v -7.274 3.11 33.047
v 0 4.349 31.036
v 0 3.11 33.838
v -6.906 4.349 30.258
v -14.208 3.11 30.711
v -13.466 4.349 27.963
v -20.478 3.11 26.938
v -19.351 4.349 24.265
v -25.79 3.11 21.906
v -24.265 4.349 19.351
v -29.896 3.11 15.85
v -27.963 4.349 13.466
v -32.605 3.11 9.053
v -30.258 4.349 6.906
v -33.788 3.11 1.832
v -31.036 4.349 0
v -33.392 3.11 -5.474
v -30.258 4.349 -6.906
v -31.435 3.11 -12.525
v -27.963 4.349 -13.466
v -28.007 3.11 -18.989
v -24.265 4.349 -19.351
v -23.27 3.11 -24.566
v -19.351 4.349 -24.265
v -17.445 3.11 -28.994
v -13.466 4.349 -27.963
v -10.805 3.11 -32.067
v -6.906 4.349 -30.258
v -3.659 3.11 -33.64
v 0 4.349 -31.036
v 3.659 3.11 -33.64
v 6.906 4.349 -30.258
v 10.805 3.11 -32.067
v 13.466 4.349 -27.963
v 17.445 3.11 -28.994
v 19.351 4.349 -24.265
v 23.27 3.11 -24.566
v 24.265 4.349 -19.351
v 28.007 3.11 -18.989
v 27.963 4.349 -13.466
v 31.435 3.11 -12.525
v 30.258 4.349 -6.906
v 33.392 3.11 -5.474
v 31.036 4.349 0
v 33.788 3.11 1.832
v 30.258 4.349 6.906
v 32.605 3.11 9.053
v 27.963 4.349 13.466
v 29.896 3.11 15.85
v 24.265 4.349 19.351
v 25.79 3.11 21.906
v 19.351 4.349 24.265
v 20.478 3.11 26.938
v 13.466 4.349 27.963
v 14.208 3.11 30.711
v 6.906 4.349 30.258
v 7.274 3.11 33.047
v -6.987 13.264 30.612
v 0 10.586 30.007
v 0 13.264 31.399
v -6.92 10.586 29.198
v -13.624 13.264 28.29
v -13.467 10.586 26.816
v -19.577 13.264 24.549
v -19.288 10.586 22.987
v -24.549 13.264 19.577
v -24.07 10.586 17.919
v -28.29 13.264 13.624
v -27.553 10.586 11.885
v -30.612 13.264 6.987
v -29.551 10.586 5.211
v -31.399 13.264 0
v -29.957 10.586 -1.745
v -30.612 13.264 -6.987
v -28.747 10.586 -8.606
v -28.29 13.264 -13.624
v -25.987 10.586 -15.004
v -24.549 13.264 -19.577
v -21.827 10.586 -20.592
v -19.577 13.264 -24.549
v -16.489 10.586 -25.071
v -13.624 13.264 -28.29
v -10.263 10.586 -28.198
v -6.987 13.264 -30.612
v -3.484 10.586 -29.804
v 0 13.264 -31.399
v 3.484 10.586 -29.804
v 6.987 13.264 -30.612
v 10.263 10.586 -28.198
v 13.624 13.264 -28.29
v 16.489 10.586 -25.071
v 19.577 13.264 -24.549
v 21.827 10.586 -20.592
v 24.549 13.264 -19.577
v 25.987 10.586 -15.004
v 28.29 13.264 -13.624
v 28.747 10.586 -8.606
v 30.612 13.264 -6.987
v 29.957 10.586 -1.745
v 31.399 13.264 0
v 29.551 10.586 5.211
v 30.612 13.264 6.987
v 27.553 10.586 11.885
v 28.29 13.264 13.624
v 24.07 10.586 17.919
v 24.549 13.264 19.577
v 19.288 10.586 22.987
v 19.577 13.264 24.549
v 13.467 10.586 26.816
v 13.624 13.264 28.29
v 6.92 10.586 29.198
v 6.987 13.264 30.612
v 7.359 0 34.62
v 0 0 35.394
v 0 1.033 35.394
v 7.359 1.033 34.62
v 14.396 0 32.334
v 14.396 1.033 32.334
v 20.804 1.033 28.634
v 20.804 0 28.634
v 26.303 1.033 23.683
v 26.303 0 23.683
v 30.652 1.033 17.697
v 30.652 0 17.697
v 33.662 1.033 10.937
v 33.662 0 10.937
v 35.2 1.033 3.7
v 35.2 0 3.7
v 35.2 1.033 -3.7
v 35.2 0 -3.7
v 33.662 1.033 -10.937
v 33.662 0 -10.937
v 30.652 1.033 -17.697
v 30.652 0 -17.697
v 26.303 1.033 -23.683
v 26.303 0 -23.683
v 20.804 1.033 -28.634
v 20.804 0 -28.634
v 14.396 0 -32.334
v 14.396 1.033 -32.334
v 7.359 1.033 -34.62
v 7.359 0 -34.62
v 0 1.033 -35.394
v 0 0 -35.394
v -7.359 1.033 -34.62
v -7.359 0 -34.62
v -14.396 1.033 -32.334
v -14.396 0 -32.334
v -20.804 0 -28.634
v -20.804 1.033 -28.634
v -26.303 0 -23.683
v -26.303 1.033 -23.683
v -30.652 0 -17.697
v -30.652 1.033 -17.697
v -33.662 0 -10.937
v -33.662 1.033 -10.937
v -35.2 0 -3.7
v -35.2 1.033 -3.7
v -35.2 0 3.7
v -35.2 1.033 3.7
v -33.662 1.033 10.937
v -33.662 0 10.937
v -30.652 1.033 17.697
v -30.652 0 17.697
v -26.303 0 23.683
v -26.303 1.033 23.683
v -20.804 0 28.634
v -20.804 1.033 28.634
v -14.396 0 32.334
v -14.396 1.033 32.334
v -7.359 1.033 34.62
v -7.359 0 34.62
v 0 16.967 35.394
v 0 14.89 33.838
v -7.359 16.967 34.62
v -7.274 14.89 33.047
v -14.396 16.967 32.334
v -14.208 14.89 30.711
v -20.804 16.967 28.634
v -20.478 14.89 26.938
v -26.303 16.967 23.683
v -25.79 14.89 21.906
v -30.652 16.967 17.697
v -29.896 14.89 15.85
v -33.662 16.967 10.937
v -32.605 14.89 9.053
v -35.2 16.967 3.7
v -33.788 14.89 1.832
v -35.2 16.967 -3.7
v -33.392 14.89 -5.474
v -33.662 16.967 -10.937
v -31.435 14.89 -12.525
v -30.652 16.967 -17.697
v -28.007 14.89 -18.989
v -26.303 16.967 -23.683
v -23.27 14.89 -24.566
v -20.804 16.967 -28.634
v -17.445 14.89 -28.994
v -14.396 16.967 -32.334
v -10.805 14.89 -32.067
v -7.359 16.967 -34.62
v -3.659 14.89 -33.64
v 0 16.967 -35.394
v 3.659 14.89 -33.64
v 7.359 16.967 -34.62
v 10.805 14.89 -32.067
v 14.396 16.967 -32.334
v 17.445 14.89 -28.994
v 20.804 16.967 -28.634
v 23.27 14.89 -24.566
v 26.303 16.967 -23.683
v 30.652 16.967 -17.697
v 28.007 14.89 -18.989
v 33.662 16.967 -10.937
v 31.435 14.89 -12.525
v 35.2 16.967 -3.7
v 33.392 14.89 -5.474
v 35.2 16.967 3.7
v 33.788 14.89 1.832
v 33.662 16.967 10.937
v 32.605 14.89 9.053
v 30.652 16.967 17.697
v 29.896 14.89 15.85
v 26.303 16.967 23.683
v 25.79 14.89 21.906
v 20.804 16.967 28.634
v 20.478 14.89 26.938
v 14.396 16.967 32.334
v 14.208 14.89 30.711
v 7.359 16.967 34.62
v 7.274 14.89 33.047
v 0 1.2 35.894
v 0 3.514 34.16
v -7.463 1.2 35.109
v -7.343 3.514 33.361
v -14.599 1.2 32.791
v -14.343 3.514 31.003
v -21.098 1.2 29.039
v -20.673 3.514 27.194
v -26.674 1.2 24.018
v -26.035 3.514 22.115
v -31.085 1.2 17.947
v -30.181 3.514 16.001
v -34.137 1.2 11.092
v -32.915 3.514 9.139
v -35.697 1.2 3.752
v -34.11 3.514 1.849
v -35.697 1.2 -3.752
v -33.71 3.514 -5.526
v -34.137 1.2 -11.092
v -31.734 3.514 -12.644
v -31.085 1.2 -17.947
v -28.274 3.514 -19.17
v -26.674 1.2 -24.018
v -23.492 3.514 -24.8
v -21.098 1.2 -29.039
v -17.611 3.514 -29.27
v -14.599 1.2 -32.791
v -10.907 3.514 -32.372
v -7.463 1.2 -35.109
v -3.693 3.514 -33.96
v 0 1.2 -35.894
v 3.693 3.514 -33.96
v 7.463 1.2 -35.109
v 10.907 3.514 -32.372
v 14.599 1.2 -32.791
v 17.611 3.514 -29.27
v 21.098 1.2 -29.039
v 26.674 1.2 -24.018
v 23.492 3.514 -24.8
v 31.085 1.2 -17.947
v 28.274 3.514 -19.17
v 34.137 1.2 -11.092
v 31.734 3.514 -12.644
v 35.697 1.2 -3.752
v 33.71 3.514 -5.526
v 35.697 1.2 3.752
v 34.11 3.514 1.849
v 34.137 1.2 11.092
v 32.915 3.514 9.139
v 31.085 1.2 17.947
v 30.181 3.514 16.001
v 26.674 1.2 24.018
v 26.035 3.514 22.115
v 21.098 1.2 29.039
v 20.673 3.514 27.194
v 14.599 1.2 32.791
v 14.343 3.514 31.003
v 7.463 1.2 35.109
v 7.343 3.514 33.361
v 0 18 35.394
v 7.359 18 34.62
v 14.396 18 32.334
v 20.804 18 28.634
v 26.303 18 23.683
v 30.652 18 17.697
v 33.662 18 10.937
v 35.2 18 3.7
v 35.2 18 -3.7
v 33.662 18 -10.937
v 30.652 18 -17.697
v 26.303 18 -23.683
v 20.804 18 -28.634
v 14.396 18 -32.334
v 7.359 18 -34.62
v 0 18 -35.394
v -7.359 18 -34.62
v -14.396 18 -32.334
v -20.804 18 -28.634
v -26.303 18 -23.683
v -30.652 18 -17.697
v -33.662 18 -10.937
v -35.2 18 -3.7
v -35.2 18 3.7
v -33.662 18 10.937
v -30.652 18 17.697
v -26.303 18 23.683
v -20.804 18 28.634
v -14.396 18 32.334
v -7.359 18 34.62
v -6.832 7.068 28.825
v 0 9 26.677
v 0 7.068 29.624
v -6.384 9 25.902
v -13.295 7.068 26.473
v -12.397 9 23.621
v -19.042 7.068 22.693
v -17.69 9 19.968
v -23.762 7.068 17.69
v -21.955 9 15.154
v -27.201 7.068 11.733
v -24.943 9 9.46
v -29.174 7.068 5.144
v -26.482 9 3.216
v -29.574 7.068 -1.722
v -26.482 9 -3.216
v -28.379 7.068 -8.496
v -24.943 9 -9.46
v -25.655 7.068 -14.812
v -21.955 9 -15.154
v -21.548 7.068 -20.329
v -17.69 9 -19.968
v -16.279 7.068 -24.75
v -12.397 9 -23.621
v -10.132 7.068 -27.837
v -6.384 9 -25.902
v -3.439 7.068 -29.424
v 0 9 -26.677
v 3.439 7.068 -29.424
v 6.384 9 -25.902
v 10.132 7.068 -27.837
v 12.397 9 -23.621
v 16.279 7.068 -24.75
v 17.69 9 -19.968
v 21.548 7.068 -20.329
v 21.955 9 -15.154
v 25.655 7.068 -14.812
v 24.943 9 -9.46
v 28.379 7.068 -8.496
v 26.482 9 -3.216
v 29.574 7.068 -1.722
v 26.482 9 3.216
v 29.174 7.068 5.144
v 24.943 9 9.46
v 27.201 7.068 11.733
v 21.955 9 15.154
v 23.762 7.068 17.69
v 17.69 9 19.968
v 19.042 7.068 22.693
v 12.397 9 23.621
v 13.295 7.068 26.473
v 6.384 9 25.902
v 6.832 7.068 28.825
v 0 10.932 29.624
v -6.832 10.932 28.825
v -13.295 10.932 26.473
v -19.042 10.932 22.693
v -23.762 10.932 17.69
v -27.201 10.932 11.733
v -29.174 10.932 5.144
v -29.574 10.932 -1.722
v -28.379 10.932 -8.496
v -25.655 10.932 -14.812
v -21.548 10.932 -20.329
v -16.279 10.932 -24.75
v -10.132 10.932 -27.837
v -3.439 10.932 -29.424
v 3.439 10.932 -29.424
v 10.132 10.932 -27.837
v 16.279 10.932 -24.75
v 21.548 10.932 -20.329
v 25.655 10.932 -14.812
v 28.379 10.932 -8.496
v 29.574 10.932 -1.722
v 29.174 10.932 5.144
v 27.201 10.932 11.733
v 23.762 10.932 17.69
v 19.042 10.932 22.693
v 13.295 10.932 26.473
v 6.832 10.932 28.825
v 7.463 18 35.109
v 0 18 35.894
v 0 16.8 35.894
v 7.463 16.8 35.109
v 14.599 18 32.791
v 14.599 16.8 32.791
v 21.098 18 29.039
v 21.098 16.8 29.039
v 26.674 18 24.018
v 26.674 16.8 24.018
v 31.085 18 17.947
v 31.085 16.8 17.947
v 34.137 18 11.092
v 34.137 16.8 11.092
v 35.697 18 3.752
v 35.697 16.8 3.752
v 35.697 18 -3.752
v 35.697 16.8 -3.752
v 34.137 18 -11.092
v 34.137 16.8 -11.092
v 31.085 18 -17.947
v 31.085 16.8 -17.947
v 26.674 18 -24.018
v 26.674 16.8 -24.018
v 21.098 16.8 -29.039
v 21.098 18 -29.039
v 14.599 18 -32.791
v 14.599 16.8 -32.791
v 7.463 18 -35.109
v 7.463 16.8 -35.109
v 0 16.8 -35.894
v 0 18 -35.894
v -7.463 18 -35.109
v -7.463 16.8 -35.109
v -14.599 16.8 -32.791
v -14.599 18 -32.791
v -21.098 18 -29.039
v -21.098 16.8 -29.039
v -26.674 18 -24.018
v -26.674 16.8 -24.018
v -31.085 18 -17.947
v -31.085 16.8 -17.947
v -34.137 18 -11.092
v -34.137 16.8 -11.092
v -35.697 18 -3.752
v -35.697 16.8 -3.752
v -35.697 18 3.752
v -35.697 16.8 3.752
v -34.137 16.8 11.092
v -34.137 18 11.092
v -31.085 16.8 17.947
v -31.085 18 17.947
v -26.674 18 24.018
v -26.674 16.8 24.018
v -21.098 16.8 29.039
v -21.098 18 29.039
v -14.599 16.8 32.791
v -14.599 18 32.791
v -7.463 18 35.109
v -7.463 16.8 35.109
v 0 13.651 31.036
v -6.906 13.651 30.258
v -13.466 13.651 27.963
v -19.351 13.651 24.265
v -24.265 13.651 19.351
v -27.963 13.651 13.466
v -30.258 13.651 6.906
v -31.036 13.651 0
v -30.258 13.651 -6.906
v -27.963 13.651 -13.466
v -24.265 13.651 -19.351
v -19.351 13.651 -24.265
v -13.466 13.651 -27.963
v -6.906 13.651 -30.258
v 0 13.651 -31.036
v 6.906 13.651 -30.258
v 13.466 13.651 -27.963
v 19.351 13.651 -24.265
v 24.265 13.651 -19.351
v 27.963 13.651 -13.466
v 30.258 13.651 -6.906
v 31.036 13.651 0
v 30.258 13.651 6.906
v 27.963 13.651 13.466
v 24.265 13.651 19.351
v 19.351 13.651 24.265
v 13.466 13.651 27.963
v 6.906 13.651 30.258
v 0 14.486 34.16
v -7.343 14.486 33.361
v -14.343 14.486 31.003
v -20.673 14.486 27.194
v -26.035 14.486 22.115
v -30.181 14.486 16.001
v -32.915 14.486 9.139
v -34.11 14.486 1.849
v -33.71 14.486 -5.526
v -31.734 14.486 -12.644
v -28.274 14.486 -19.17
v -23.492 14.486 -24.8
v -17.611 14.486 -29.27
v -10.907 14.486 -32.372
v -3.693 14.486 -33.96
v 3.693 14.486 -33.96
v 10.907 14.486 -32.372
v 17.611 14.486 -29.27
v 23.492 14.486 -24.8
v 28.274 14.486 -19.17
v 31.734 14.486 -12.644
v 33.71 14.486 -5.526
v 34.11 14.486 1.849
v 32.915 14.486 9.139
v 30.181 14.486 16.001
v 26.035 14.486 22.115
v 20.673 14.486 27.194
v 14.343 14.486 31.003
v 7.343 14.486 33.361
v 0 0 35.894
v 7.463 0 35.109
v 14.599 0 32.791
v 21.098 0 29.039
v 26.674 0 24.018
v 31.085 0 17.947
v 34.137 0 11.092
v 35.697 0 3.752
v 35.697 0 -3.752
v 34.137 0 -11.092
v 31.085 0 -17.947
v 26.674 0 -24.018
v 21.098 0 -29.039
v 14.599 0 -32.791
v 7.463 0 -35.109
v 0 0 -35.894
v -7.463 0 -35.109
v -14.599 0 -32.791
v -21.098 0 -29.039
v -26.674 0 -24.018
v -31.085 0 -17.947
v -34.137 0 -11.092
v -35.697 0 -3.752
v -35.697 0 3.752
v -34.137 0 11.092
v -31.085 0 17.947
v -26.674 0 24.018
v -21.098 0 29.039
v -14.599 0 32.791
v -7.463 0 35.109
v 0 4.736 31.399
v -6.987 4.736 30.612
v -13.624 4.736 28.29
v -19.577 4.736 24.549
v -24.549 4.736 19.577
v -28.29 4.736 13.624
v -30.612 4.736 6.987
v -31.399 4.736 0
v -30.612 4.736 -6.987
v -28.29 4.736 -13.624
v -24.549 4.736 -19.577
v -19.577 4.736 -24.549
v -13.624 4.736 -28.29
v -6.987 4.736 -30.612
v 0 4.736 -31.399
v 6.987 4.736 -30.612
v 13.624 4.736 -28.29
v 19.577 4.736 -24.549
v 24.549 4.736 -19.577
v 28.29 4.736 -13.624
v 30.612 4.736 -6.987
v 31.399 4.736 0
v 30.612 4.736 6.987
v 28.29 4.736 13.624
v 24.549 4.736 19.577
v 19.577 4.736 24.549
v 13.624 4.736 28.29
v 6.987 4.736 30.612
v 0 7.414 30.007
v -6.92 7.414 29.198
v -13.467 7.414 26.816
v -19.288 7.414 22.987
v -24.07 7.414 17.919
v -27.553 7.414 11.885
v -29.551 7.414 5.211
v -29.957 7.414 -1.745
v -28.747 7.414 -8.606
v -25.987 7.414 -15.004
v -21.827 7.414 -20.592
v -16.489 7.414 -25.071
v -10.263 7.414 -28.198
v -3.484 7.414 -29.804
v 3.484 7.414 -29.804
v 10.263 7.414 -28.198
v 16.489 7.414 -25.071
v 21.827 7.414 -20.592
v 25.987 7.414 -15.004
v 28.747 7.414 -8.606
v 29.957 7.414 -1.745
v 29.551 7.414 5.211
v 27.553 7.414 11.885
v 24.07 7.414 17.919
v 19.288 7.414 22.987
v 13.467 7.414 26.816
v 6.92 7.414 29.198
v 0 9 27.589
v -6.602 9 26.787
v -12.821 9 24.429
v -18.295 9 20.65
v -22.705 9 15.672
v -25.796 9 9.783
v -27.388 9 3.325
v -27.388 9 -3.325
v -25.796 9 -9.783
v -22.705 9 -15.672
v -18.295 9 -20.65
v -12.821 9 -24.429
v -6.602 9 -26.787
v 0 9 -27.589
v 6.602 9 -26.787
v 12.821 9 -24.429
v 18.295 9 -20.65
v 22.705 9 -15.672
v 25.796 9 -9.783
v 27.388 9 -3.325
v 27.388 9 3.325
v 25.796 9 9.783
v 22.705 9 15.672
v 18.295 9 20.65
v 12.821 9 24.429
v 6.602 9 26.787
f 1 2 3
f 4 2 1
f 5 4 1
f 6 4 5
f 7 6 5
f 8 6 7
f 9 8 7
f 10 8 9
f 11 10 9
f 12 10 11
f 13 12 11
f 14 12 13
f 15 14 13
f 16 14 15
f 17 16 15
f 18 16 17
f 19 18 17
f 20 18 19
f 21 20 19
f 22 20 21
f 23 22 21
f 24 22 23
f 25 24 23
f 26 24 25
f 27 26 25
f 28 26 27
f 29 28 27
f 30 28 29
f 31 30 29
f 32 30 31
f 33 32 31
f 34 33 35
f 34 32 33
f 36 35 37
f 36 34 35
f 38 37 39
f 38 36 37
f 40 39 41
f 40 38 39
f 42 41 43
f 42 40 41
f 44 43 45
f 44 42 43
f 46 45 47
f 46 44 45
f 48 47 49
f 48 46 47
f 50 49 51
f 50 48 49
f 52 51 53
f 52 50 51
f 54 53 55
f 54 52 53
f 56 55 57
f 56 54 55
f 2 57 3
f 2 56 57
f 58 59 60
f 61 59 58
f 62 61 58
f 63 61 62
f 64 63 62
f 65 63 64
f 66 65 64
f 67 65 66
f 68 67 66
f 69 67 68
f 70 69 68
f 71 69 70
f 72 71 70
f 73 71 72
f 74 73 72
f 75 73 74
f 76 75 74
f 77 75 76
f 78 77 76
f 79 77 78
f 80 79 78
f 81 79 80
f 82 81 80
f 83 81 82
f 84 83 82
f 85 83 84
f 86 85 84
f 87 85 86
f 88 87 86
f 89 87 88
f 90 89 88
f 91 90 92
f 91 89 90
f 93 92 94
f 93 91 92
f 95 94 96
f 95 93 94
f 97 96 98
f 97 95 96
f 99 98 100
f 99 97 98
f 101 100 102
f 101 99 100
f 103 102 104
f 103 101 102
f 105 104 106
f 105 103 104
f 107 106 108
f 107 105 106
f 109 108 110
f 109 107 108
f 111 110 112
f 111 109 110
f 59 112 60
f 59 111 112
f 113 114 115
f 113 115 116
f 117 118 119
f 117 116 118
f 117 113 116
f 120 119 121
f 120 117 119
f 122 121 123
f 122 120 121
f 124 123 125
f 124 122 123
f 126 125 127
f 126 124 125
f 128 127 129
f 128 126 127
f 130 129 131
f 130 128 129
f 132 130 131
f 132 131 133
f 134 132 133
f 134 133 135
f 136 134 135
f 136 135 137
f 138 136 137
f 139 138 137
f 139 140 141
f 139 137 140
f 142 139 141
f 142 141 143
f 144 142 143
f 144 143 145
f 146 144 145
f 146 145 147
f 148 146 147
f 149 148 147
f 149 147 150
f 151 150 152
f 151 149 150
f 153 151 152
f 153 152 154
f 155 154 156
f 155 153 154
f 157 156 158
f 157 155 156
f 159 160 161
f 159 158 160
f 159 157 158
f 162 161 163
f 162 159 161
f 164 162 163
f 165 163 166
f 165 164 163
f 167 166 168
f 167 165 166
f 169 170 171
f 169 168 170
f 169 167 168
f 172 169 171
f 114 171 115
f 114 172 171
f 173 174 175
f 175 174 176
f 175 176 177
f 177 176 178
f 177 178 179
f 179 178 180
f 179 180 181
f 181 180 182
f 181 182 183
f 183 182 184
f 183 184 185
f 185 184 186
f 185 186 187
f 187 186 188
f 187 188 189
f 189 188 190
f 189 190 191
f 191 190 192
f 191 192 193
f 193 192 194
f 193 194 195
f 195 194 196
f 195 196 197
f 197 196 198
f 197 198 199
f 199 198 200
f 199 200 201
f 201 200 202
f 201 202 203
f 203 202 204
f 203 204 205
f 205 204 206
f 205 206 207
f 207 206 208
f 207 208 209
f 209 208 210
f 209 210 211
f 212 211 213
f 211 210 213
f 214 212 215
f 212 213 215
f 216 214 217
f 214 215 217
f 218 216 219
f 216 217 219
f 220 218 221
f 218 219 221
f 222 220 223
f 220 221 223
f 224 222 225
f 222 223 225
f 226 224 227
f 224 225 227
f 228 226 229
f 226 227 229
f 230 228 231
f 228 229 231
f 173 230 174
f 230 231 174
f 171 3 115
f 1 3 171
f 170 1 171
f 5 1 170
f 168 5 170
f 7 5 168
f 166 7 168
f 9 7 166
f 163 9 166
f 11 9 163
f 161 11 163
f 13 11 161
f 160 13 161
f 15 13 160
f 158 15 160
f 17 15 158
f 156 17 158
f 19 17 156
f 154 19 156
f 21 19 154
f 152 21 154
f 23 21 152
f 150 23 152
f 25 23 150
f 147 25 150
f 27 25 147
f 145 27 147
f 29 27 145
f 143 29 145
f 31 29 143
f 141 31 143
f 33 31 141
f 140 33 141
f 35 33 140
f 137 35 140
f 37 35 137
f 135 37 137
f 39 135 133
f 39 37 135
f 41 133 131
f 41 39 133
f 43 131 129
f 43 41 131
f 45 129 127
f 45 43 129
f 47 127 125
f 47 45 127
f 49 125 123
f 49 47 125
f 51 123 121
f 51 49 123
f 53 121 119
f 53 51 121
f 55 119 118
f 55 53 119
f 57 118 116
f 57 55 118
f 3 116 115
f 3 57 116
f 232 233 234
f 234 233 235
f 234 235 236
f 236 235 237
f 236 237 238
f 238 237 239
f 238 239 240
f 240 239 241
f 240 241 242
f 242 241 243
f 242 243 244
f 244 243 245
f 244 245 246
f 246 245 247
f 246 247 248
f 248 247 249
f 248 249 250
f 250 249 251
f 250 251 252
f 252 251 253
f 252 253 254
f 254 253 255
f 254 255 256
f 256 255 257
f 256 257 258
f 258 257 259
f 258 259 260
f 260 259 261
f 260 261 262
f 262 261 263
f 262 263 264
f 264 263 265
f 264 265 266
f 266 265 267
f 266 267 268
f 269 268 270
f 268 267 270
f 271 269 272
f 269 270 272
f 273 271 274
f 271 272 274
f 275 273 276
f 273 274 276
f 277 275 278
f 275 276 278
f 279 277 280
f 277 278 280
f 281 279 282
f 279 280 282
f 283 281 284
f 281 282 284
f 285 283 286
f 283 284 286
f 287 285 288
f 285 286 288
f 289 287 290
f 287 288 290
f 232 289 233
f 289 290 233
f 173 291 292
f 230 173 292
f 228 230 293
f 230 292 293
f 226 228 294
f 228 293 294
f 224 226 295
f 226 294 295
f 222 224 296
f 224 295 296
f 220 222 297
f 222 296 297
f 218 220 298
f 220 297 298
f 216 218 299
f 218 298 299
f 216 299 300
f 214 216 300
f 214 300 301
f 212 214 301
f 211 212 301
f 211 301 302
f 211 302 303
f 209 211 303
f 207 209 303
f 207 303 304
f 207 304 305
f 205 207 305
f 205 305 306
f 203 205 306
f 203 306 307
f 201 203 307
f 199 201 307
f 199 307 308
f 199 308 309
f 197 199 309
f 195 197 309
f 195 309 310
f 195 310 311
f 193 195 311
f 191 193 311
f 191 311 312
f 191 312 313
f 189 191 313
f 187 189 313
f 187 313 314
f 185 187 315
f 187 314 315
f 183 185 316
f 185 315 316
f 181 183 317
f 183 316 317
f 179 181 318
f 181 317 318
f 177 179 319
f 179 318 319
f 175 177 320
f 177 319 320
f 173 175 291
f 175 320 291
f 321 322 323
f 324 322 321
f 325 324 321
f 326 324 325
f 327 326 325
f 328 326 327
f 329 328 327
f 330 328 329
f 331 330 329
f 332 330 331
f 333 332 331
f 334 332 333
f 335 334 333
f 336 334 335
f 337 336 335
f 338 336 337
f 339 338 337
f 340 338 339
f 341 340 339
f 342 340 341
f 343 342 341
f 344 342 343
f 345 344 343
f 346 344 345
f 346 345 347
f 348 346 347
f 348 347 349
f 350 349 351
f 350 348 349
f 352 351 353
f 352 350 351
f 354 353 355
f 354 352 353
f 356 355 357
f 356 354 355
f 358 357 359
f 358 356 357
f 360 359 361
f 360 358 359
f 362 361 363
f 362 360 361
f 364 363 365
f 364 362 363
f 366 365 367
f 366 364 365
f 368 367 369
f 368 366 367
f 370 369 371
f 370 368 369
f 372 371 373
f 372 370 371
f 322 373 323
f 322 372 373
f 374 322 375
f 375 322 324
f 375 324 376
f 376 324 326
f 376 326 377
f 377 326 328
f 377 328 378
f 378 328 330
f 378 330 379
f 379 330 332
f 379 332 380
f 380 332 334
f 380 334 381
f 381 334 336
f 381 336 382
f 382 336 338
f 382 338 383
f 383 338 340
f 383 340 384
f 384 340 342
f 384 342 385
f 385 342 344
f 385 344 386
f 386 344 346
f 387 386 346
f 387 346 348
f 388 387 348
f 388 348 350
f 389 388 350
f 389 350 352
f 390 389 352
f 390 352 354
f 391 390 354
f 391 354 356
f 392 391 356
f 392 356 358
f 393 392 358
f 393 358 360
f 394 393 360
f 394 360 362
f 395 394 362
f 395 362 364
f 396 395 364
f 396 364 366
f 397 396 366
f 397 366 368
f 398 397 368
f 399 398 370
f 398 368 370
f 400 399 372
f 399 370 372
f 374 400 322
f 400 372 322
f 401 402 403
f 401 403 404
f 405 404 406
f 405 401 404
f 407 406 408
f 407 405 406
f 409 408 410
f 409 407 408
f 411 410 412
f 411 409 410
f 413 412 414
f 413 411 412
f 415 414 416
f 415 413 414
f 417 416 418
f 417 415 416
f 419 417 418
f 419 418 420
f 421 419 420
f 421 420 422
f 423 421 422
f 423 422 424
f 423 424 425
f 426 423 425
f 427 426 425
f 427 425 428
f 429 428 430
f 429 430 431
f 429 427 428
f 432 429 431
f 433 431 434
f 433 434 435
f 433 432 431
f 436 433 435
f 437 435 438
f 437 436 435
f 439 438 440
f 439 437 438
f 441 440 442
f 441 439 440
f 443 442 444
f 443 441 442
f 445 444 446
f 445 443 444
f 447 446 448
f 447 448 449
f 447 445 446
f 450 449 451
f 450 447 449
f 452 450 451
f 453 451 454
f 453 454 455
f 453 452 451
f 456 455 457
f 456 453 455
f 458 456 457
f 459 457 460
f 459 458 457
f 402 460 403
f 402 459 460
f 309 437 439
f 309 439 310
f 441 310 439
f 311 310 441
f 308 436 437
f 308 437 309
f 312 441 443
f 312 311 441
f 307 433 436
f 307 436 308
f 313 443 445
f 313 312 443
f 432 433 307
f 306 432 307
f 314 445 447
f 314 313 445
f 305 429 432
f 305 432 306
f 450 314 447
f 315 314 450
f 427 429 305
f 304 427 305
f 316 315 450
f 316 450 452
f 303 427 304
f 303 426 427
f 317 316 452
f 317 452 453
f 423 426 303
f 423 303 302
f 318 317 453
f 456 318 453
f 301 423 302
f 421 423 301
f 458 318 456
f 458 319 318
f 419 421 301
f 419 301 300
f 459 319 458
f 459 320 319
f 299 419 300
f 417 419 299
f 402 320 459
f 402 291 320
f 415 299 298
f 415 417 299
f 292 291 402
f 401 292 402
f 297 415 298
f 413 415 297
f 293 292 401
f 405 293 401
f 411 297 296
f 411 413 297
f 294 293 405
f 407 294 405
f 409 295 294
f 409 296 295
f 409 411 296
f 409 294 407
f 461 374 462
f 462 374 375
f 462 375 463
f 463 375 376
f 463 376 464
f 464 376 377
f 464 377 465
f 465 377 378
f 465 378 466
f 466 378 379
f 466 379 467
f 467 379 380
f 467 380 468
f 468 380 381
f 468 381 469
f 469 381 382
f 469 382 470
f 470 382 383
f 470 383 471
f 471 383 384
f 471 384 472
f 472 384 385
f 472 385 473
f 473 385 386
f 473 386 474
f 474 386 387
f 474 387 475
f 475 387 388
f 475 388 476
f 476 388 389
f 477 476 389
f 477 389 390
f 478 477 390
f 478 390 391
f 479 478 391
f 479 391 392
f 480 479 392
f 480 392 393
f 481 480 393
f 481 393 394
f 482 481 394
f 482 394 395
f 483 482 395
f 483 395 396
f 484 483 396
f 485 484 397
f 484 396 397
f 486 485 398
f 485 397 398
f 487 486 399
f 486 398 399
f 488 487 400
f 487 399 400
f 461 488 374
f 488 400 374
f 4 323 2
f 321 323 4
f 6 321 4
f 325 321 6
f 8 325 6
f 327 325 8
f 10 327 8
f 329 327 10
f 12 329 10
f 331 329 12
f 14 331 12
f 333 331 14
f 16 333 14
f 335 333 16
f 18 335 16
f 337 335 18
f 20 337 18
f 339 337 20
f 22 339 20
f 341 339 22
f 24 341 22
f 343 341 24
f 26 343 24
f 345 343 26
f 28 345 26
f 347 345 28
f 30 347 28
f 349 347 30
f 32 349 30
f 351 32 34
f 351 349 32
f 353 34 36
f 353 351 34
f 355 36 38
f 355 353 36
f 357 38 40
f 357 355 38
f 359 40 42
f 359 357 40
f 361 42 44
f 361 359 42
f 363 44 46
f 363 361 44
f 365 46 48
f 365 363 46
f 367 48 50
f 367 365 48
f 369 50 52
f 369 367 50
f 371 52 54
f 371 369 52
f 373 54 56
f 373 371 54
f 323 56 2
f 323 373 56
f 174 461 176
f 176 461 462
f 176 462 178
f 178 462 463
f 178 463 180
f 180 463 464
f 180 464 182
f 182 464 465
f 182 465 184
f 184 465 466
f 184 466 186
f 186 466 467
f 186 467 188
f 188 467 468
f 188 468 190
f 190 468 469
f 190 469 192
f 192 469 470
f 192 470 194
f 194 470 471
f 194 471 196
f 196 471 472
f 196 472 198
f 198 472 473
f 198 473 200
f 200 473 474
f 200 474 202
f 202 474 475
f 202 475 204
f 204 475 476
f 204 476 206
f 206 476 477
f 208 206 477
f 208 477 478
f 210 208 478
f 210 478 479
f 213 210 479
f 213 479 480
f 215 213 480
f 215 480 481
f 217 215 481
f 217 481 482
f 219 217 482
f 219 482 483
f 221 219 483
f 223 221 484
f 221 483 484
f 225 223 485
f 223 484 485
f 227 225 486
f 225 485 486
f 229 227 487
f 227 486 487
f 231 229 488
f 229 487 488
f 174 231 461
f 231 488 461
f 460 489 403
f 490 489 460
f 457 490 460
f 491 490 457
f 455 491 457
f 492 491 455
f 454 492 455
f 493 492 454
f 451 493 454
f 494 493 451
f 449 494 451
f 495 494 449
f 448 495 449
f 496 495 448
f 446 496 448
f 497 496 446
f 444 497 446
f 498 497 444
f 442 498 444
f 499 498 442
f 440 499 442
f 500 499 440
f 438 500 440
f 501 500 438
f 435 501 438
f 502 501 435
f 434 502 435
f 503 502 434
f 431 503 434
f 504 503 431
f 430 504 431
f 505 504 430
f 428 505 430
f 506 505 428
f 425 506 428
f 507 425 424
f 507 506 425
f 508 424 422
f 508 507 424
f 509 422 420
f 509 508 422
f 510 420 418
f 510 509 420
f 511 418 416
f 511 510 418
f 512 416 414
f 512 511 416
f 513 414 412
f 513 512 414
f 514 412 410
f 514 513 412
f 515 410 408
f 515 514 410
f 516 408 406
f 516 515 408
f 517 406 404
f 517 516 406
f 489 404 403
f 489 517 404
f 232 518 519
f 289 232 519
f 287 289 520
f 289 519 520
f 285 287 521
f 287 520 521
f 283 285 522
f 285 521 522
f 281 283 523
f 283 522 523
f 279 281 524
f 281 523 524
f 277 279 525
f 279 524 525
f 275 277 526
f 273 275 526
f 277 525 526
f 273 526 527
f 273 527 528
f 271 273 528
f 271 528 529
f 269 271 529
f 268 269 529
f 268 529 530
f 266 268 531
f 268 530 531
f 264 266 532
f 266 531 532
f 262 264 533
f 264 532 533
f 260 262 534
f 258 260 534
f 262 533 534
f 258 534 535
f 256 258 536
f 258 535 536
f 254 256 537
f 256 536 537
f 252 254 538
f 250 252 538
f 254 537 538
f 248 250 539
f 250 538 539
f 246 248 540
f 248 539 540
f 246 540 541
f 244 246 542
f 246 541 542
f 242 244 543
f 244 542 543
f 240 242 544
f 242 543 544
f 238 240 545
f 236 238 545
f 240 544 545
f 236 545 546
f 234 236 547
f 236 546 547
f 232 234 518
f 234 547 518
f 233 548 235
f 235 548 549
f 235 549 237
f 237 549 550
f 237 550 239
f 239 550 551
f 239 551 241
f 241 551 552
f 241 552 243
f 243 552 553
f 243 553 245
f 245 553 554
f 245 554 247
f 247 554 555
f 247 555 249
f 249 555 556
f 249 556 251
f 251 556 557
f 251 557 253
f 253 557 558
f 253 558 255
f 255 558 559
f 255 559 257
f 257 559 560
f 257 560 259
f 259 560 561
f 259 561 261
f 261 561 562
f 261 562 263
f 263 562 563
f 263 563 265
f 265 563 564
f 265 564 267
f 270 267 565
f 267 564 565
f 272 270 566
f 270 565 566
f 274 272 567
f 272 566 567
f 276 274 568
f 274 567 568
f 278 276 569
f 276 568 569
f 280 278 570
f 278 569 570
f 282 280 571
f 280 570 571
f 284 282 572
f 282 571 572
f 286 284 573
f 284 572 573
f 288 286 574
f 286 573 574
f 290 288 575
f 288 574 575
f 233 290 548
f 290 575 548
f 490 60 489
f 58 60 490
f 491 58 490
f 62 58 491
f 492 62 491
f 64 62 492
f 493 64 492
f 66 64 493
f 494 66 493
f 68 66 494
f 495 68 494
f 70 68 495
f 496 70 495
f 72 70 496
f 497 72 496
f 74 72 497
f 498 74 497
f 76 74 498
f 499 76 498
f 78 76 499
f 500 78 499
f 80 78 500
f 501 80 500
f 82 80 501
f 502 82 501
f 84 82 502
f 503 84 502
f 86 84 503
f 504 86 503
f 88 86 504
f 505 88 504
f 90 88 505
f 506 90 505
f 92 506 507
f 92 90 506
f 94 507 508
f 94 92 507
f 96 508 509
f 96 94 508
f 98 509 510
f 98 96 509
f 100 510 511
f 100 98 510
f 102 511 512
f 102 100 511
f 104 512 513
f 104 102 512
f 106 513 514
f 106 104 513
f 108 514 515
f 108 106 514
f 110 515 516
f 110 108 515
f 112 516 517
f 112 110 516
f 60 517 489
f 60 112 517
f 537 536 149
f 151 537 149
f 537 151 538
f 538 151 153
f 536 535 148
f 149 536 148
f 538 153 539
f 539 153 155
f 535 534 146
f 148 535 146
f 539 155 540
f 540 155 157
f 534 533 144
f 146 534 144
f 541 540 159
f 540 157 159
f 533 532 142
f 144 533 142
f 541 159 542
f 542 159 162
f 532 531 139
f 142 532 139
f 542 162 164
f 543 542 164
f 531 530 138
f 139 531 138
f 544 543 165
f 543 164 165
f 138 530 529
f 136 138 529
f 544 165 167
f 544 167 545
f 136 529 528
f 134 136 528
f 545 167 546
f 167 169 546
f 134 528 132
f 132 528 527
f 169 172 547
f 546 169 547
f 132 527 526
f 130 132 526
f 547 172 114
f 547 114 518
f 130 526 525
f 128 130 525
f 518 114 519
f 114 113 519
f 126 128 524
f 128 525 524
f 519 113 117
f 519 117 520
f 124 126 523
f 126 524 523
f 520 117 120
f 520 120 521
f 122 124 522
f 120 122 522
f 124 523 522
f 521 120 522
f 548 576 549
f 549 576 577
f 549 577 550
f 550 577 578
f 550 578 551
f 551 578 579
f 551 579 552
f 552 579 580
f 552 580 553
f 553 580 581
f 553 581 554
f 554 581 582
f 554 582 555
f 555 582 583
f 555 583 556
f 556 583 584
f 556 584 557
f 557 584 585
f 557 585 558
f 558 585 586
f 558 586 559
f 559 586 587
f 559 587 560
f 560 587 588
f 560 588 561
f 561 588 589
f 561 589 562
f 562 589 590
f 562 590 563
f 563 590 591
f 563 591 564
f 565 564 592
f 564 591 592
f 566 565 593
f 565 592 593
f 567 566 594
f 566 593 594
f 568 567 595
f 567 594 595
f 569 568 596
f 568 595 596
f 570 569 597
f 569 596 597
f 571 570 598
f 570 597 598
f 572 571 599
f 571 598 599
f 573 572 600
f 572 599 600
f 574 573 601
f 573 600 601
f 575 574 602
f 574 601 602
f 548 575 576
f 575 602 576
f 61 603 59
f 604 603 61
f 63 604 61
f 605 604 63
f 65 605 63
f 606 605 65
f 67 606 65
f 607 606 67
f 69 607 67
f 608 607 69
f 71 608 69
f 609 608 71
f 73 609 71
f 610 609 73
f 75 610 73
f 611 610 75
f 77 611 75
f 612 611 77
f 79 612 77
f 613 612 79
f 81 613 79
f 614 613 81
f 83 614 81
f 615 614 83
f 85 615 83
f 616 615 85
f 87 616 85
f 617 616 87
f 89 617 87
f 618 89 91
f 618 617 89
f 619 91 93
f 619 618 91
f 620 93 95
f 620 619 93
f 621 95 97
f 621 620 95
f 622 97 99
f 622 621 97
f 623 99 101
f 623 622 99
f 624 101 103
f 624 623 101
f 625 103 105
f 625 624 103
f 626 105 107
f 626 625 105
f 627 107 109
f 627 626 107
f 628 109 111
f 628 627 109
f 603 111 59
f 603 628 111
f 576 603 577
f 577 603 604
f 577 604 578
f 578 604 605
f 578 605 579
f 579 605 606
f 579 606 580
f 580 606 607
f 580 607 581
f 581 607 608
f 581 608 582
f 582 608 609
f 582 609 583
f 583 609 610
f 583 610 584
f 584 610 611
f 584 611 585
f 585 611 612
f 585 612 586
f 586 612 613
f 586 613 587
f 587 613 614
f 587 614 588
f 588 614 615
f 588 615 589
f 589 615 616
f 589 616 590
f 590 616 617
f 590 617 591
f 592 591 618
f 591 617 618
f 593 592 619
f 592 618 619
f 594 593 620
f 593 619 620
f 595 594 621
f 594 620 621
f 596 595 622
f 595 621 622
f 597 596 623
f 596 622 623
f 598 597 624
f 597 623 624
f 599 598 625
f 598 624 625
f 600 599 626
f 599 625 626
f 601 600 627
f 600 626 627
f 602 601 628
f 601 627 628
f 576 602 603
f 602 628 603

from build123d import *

# Parameters (mm, degrees)
SKETCH_1_R      = 35.893803705
EXTRUDE_1_DEPTH = 1.2
SHELL_1_T       = -0.5


with BuildPart() as part:
    # 스케치1 → 보스-돌출1 (new body)
    with BuildSketch(Plane(origin=(0, 0, 0), x_dir=(1, 0, 0), z_dir=(0, 1, 0))):
        with Locations(Location((0, 0, 0), (0, 0, 270))):
            Circle(SKETCH_1_R)
    extrude_1 = extrude(amount=EXTRUDE_1_DEPTH)

    # 스케치4 → 회전1 (revolve)
    with BuildSketch(Plane(origin=(0, 0, 0), x_dir=(0, 0, -1), z_dir=(1, 0, 0))):
        Polygon((-35.893803705, 1.2), (-34.159836859, 3.514461722), (-31.398977187, 4.735538278), (-30.00730795, 7.414461722), (-27.588745887, 9), (0, 9), (0, 1.2), align=None)
    revolve_1 = revolve(axis=Axis((0, 9, 0), (0, -1, 0)))

    # 대칭 복사1: 보스-돌출1, 회전1 across plane
    add(extrude_1.mirror(Plane(origin=(0, 9, 27.588745887), x_dir=(0, 0, 1), z_dir=(0, 1, 0))))
    add(revolve_1.mirror(Plane(origin=(0, 9, 27.588745887), x_dir=(0, 0, 1), z_dir=(0, 1, 0))))

    # 쉘1
    shell_1_openings = [part.faces().sort_by_distance(p)[0] for p in [
        (0, 18, 0),
        (0, 0, 0),
    ]]
    offset(amount=SHELL_1_T, openings=shell_1_openings, kind=Kind.INTERSECTION)


solid = part.part
